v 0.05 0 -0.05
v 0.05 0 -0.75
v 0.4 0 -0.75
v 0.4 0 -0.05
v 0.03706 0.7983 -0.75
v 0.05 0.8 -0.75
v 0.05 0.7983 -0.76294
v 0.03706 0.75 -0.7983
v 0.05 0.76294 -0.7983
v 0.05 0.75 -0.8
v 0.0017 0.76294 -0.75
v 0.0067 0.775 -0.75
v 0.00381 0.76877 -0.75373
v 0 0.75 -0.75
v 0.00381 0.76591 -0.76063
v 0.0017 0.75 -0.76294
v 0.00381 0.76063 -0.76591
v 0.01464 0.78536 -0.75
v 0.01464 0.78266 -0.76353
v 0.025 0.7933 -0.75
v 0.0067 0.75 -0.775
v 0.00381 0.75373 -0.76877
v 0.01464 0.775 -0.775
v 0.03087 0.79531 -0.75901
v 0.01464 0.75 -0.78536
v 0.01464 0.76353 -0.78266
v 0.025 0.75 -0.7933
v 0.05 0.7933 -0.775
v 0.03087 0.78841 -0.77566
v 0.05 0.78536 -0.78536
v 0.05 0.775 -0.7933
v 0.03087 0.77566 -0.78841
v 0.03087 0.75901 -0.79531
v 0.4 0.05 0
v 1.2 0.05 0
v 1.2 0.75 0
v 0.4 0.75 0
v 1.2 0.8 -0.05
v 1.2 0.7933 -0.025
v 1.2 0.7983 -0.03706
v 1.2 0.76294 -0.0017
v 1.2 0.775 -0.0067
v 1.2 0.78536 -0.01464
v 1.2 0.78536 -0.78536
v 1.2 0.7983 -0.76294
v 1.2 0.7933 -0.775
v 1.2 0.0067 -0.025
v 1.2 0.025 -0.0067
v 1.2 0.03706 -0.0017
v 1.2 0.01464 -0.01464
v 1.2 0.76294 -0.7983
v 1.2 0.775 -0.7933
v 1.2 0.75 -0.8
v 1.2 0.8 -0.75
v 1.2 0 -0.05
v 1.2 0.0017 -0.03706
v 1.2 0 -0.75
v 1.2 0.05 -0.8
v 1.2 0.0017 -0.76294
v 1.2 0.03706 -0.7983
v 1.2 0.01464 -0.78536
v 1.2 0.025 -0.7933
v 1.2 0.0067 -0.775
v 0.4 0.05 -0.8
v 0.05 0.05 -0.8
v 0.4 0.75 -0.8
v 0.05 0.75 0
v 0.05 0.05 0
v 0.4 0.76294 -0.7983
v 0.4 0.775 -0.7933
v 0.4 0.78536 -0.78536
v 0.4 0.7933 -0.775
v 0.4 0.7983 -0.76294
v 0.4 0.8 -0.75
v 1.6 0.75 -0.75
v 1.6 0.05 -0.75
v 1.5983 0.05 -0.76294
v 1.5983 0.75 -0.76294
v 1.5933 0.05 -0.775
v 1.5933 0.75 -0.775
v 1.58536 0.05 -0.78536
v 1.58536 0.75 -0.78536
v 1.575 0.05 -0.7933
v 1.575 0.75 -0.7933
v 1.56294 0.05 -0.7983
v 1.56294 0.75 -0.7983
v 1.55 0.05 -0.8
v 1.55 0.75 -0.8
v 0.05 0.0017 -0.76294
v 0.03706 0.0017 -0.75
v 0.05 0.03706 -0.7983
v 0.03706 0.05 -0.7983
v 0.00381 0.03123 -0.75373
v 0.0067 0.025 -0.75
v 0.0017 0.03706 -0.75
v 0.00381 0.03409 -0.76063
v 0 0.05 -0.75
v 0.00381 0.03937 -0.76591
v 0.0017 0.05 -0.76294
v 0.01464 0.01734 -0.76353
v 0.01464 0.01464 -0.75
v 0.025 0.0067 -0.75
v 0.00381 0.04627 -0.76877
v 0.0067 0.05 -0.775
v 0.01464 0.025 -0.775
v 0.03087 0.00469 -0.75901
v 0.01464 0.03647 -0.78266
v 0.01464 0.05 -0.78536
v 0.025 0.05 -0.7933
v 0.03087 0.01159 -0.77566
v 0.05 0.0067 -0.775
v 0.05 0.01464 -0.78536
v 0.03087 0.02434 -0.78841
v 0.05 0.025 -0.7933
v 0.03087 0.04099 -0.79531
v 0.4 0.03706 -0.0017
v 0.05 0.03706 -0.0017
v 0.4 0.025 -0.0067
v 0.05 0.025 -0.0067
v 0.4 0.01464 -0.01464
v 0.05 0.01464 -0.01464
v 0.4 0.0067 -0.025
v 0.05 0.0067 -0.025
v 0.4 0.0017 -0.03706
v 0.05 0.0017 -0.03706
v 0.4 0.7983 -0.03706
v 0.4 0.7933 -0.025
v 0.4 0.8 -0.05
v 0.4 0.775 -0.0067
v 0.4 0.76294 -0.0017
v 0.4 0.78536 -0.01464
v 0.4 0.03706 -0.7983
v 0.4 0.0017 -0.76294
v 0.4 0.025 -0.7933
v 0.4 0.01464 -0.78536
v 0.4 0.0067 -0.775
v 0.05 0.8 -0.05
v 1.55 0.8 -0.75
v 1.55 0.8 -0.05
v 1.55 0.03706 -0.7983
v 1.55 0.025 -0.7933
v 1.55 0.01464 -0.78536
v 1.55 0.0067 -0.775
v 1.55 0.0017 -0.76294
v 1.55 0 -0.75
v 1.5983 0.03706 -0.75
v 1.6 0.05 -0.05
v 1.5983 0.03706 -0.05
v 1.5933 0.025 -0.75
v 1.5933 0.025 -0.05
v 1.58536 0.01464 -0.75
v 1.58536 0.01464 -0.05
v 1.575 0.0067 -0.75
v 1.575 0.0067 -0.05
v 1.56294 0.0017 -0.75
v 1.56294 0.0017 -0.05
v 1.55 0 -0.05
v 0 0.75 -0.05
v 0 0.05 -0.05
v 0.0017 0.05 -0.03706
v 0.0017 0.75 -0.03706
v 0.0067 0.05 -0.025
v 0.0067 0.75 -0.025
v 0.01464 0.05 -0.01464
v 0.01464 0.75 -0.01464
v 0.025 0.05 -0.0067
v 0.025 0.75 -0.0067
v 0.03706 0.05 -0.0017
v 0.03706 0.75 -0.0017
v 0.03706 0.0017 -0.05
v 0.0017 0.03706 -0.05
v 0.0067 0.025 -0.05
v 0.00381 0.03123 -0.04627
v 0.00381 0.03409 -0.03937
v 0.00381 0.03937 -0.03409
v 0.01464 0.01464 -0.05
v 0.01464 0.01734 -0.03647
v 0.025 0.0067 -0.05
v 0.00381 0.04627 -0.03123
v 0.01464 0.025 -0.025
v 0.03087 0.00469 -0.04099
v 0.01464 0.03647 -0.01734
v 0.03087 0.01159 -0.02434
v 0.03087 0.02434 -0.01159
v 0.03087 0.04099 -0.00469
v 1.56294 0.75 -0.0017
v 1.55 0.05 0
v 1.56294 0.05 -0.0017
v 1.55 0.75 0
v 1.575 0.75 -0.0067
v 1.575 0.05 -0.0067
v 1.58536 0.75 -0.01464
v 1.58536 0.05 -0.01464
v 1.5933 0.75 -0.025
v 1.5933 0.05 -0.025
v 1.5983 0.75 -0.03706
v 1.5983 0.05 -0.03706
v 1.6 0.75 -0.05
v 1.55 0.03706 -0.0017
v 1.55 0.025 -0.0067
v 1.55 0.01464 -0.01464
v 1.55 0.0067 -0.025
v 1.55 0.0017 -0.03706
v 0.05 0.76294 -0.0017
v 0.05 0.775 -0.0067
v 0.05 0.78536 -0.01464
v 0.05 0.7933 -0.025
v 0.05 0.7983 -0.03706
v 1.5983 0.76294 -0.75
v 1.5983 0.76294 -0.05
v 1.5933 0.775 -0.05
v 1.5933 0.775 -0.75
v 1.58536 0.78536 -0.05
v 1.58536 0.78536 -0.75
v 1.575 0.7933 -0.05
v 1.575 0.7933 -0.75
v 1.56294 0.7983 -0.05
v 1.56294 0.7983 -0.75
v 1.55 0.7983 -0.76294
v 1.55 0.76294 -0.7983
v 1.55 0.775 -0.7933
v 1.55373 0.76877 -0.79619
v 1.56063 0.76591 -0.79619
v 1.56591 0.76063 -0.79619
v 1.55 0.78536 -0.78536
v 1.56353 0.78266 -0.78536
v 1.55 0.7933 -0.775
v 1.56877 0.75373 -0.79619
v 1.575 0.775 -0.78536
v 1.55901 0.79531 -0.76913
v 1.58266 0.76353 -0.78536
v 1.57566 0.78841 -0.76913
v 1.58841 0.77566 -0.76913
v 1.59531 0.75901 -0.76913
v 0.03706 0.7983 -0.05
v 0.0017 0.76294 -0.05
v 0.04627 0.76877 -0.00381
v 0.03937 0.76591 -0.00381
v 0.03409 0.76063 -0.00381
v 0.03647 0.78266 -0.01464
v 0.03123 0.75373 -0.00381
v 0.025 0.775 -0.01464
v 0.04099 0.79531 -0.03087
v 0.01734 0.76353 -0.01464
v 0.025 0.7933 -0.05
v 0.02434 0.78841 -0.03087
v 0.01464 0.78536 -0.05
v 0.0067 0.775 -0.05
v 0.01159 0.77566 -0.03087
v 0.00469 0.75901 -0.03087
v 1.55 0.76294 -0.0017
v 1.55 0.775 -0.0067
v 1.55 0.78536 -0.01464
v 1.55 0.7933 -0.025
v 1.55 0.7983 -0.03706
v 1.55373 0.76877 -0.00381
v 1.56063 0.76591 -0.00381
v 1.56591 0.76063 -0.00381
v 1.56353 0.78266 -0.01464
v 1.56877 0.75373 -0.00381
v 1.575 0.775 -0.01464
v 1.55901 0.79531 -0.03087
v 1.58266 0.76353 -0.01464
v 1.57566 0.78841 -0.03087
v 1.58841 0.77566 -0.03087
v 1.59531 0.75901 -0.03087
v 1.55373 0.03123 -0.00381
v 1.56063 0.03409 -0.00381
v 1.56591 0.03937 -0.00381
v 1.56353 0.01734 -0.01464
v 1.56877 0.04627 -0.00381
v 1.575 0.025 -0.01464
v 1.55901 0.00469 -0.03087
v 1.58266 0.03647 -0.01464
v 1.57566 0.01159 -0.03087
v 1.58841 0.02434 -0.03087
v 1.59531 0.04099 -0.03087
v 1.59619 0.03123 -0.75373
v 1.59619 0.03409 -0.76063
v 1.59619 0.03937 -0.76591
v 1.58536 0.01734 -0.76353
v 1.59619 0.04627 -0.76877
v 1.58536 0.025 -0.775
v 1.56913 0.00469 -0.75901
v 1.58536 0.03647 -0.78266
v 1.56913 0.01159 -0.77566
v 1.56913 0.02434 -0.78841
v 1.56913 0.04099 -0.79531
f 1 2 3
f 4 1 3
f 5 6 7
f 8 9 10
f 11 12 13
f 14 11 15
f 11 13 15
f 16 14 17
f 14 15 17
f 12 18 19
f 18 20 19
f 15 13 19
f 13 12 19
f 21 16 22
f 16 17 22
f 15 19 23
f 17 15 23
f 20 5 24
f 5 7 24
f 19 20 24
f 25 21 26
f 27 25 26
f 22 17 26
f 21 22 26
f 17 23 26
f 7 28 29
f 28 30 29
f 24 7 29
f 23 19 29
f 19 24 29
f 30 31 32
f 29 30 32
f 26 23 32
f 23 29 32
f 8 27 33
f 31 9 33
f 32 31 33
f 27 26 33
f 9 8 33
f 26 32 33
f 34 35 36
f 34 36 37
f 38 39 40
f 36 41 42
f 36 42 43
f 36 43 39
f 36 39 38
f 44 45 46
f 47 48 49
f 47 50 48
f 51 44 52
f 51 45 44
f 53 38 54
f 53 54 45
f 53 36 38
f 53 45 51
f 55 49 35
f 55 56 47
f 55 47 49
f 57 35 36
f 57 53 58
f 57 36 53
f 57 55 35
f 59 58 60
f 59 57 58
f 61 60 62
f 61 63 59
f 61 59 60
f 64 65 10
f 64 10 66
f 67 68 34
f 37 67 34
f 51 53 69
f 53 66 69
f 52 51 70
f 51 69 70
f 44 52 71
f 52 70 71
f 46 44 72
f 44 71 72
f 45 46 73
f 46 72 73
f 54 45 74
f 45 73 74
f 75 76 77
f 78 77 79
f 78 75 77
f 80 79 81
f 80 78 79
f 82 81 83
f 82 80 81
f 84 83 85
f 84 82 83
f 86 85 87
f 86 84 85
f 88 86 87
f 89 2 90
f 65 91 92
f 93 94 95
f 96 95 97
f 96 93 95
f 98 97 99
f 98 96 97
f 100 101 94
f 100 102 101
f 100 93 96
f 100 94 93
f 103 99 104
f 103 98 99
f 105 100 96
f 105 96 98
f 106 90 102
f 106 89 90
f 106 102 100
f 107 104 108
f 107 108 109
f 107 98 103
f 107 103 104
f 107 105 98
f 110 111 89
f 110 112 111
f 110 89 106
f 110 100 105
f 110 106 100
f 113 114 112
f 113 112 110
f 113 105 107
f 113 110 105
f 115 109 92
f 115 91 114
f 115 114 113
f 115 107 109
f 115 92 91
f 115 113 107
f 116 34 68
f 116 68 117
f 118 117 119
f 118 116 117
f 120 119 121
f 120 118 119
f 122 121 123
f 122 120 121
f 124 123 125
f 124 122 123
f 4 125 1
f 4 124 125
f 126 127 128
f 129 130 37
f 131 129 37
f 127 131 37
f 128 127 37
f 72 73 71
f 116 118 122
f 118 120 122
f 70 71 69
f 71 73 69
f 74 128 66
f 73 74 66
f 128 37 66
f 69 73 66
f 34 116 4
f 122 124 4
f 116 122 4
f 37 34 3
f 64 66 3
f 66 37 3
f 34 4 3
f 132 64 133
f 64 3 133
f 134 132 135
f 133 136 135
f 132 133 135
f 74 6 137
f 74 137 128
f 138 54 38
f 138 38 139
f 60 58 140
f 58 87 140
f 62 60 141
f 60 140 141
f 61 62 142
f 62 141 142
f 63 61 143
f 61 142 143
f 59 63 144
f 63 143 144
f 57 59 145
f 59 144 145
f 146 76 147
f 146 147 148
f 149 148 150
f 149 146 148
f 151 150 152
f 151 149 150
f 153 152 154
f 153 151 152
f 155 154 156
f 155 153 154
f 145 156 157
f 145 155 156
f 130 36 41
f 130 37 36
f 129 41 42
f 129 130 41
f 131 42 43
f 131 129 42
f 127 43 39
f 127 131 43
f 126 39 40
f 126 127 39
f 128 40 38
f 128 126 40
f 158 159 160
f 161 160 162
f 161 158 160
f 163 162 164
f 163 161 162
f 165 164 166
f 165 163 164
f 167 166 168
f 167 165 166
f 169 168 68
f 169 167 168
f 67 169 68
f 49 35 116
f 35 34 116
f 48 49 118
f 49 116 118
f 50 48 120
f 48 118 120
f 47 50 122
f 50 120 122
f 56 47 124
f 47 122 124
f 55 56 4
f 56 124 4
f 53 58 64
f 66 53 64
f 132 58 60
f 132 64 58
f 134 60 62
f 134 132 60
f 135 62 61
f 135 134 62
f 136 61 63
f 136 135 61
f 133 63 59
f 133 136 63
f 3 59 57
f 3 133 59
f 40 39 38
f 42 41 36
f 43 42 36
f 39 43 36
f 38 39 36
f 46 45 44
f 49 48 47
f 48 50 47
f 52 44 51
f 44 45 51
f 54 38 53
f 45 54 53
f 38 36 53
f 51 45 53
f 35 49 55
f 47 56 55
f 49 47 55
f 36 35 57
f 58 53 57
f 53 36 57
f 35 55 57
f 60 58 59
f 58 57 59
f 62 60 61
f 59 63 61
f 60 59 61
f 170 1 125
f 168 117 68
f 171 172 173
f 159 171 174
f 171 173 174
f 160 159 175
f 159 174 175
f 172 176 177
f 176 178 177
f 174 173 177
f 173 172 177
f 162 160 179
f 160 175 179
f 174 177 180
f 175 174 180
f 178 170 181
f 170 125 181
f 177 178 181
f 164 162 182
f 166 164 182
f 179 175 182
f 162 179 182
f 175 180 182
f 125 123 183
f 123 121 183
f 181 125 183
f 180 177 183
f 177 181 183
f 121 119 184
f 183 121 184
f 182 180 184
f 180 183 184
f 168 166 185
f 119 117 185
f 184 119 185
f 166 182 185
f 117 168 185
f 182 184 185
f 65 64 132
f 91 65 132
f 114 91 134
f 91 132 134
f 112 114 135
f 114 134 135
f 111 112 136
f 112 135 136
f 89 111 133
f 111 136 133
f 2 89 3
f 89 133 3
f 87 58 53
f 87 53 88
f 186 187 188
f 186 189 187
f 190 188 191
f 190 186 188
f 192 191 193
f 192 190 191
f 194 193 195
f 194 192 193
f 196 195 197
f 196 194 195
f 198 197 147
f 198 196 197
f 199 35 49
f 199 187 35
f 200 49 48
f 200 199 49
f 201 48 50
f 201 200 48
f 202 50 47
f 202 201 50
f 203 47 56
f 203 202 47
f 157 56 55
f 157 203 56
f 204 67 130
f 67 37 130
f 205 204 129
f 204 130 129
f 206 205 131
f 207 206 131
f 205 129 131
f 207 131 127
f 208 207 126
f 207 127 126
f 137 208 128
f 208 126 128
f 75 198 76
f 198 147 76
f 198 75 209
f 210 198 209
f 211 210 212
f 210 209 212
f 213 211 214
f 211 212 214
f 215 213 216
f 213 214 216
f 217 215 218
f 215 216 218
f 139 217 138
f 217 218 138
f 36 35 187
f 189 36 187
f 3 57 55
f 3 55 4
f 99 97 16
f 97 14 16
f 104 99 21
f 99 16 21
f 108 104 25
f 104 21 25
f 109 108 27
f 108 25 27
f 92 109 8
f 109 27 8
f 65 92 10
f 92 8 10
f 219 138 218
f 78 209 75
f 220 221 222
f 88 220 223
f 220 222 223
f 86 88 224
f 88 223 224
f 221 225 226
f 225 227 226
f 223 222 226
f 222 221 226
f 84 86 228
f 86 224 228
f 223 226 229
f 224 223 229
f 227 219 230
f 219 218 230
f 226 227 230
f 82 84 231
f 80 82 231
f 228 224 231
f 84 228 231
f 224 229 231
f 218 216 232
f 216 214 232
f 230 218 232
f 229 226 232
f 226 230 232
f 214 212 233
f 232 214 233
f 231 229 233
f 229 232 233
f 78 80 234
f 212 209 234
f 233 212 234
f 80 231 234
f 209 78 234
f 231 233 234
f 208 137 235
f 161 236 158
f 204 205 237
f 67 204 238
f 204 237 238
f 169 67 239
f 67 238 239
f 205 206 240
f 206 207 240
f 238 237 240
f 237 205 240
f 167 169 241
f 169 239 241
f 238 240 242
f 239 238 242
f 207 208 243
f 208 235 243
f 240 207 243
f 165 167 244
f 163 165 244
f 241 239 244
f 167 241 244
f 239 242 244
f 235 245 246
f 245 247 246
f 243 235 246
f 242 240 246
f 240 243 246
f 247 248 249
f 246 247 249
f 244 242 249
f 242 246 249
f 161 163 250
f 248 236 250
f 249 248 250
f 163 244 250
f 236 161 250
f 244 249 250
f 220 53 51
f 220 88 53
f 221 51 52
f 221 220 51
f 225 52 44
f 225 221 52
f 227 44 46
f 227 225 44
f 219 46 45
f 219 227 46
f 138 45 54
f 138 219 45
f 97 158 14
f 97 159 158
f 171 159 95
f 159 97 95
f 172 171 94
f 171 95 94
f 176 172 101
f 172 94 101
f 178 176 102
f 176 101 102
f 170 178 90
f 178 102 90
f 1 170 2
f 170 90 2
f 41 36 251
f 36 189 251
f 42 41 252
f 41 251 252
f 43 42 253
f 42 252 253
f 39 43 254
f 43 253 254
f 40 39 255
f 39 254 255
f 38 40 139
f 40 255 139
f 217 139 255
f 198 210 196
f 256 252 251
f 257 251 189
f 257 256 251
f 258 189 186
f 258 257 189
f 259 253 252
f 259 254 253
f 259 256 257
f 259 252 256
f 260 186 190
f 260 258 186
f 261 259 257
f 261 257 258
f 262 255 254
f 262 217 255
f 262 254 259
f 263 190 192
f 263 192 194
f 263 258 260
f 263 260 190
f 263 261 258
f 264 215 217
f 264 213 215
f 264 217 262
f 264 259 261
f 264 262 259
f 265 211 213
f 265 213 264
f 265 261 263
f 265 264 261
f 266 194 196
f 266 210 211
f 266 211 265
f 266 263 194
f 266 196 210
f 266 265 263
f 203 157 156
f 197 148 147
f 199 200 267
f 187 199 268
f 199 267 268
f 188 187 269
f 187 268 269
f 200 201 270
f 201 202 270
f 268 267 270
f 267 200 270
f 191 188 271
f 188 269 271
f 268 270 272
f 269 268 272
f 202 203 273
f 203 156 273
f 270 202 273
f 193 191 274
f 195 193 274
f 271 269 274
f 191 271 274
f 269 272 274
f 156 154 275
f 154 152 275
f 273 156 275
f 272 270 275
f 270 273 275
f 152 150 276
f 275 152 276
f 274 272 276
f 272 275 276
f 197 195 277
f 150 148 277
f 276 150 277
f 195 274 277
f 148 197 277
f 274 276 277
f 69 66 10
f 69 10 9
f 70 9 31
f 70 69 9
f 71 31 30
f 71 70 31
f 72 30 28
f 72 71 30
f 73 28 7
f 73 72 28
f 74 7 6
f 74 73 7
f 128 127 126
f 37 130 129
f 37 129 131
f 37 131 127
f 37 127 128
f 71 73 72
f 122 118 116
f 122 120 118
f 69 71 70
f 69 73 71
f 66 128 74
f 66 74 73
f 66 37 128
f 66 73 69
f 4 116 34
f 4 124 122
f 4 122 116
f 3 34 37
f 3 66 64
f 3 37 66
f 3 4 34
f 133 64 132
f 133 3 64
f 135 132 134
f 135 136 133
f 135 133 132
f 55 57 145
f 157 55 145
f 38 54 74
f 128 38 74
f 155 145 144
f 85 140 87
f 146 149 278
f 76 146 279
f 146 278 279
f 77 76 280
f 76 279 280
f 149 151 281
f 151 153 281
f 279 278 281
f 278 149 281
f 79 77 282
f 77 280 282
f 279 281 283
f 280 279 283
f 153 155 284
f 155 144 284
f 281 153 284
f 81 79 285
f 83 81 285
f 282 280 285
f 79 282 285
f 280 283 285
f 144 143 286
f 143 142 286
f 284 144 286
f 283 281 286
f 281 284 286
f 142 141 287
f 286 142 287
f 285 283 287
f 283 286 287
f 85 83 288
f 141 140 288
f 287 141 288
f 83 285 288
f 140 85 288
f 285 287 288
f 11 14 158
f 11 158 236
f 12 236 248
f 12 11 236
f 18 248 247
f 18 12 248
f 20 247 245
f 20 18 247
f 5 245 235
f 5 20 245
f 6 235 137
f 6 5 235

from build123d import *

# Parameters (mm, degrees)
SKETCH3_W             = 0.4
SKETCH3_H             = 0.8
BOSS_EXTRUDE2_DEPTH   = 0.8
BOSS_EXTRUDE2_2_DEPTH = 0.8
SKETCH4_W             = 0.8
SKETCH4_H             = 0.8
BOSS_EXTRUDE3_DEPTH   = 0.8
FILLET1_R             = 0.05
FILLET2_R             = 0.05
FILLET3_R             = 0.05


with BuildPart() as part:
    # Sketch3 → Boss-Extrude2 (new body)
    with BuildSketch(Plane(origin=(0, 0, 0), x_dir=(1, 0, 0), z_dir=(0, 1, 0))):
        with Locations((0.2, 0.4)):
            Rectangle(SKETCH3_W, SKETCH3_H)
    extrude(amount=BOSS_EXTRUDE2_DEPTH)

    # Fillet1
    fillet1_edges = [part.edges().sort_by_distance(p)[0] for p in [
        (0.2, 0.8, -0.8),
        (0, 0.8, -0.4),
        (0.2, 0, -0.8),
        (0.2, 0, 0),
        (0, 0, -0.4),
        (0.2, 0.8, 0),
        (0, 0.4, -0.8),
        (0, 0.4, 0),
    ]]
    fillet(fillet1_edges, radius=FILLET1_R)


with BuildPart() as body_2:
    # Sketch3 → Boss-Extrude2 2 (new body)
    with BuildSketch(Plane(origin=(0, 0, 0), x_dir=(1, 0, 0), z_dir=(0, 1, 0))):
        with Locations((1.4, 0.4)):
            Rectangle(SKETCH3_W, SKETCH3_H)
    extrude(amount=BOSS_EXTRUDE2_2_DEPTH)

    # Fillet2
    fillet2_edges = [body_2.edges().sort_by_distance(p)[0] for p in [
        (1.6, 0.8, -0.4),
        (1.4, 0.8, -0.8),
        (1.4, 0, -0.8),
        (1.6, 0, -0.4),
        (1.4, 0, 0),
        (1.4, 0.8, 0),
        (1.6, 0.4, -0.8),
        (1.6, 0.4, 0),
    ]]
    fillet(fillet2_edges, radius=FILLET2_R)


with BuildPart() as body_3:
    # Sketch4 → Boss-Extrude3 (new body)
    with BuildSketch(Plane(origin=(0, 0, 0), x_dir=(-1, 0, 0), z_dir=(0, -1, 0))):
        with Locations((-0.8, 0.4)):
            Rectangle(SKETCH4_W, SKETCH4_H)
    extrude(amount=-BOSS_EXTRUDE3_DEPTH)

    # Fillet3
    fillet3_edges = [body_3.edges().sort_by_distance(p)[0] for p in [
        (0.8, 0.8, 0),
        (0.8, 0, 0),
        (0.8, 0, -0.8),
        (0.8, 0.8, -0.8),
    ]]
    fillet(fillet3_edges, radius=FILLET3_R)


solid = Compound([part.part, body_2.part, body_3.part])
